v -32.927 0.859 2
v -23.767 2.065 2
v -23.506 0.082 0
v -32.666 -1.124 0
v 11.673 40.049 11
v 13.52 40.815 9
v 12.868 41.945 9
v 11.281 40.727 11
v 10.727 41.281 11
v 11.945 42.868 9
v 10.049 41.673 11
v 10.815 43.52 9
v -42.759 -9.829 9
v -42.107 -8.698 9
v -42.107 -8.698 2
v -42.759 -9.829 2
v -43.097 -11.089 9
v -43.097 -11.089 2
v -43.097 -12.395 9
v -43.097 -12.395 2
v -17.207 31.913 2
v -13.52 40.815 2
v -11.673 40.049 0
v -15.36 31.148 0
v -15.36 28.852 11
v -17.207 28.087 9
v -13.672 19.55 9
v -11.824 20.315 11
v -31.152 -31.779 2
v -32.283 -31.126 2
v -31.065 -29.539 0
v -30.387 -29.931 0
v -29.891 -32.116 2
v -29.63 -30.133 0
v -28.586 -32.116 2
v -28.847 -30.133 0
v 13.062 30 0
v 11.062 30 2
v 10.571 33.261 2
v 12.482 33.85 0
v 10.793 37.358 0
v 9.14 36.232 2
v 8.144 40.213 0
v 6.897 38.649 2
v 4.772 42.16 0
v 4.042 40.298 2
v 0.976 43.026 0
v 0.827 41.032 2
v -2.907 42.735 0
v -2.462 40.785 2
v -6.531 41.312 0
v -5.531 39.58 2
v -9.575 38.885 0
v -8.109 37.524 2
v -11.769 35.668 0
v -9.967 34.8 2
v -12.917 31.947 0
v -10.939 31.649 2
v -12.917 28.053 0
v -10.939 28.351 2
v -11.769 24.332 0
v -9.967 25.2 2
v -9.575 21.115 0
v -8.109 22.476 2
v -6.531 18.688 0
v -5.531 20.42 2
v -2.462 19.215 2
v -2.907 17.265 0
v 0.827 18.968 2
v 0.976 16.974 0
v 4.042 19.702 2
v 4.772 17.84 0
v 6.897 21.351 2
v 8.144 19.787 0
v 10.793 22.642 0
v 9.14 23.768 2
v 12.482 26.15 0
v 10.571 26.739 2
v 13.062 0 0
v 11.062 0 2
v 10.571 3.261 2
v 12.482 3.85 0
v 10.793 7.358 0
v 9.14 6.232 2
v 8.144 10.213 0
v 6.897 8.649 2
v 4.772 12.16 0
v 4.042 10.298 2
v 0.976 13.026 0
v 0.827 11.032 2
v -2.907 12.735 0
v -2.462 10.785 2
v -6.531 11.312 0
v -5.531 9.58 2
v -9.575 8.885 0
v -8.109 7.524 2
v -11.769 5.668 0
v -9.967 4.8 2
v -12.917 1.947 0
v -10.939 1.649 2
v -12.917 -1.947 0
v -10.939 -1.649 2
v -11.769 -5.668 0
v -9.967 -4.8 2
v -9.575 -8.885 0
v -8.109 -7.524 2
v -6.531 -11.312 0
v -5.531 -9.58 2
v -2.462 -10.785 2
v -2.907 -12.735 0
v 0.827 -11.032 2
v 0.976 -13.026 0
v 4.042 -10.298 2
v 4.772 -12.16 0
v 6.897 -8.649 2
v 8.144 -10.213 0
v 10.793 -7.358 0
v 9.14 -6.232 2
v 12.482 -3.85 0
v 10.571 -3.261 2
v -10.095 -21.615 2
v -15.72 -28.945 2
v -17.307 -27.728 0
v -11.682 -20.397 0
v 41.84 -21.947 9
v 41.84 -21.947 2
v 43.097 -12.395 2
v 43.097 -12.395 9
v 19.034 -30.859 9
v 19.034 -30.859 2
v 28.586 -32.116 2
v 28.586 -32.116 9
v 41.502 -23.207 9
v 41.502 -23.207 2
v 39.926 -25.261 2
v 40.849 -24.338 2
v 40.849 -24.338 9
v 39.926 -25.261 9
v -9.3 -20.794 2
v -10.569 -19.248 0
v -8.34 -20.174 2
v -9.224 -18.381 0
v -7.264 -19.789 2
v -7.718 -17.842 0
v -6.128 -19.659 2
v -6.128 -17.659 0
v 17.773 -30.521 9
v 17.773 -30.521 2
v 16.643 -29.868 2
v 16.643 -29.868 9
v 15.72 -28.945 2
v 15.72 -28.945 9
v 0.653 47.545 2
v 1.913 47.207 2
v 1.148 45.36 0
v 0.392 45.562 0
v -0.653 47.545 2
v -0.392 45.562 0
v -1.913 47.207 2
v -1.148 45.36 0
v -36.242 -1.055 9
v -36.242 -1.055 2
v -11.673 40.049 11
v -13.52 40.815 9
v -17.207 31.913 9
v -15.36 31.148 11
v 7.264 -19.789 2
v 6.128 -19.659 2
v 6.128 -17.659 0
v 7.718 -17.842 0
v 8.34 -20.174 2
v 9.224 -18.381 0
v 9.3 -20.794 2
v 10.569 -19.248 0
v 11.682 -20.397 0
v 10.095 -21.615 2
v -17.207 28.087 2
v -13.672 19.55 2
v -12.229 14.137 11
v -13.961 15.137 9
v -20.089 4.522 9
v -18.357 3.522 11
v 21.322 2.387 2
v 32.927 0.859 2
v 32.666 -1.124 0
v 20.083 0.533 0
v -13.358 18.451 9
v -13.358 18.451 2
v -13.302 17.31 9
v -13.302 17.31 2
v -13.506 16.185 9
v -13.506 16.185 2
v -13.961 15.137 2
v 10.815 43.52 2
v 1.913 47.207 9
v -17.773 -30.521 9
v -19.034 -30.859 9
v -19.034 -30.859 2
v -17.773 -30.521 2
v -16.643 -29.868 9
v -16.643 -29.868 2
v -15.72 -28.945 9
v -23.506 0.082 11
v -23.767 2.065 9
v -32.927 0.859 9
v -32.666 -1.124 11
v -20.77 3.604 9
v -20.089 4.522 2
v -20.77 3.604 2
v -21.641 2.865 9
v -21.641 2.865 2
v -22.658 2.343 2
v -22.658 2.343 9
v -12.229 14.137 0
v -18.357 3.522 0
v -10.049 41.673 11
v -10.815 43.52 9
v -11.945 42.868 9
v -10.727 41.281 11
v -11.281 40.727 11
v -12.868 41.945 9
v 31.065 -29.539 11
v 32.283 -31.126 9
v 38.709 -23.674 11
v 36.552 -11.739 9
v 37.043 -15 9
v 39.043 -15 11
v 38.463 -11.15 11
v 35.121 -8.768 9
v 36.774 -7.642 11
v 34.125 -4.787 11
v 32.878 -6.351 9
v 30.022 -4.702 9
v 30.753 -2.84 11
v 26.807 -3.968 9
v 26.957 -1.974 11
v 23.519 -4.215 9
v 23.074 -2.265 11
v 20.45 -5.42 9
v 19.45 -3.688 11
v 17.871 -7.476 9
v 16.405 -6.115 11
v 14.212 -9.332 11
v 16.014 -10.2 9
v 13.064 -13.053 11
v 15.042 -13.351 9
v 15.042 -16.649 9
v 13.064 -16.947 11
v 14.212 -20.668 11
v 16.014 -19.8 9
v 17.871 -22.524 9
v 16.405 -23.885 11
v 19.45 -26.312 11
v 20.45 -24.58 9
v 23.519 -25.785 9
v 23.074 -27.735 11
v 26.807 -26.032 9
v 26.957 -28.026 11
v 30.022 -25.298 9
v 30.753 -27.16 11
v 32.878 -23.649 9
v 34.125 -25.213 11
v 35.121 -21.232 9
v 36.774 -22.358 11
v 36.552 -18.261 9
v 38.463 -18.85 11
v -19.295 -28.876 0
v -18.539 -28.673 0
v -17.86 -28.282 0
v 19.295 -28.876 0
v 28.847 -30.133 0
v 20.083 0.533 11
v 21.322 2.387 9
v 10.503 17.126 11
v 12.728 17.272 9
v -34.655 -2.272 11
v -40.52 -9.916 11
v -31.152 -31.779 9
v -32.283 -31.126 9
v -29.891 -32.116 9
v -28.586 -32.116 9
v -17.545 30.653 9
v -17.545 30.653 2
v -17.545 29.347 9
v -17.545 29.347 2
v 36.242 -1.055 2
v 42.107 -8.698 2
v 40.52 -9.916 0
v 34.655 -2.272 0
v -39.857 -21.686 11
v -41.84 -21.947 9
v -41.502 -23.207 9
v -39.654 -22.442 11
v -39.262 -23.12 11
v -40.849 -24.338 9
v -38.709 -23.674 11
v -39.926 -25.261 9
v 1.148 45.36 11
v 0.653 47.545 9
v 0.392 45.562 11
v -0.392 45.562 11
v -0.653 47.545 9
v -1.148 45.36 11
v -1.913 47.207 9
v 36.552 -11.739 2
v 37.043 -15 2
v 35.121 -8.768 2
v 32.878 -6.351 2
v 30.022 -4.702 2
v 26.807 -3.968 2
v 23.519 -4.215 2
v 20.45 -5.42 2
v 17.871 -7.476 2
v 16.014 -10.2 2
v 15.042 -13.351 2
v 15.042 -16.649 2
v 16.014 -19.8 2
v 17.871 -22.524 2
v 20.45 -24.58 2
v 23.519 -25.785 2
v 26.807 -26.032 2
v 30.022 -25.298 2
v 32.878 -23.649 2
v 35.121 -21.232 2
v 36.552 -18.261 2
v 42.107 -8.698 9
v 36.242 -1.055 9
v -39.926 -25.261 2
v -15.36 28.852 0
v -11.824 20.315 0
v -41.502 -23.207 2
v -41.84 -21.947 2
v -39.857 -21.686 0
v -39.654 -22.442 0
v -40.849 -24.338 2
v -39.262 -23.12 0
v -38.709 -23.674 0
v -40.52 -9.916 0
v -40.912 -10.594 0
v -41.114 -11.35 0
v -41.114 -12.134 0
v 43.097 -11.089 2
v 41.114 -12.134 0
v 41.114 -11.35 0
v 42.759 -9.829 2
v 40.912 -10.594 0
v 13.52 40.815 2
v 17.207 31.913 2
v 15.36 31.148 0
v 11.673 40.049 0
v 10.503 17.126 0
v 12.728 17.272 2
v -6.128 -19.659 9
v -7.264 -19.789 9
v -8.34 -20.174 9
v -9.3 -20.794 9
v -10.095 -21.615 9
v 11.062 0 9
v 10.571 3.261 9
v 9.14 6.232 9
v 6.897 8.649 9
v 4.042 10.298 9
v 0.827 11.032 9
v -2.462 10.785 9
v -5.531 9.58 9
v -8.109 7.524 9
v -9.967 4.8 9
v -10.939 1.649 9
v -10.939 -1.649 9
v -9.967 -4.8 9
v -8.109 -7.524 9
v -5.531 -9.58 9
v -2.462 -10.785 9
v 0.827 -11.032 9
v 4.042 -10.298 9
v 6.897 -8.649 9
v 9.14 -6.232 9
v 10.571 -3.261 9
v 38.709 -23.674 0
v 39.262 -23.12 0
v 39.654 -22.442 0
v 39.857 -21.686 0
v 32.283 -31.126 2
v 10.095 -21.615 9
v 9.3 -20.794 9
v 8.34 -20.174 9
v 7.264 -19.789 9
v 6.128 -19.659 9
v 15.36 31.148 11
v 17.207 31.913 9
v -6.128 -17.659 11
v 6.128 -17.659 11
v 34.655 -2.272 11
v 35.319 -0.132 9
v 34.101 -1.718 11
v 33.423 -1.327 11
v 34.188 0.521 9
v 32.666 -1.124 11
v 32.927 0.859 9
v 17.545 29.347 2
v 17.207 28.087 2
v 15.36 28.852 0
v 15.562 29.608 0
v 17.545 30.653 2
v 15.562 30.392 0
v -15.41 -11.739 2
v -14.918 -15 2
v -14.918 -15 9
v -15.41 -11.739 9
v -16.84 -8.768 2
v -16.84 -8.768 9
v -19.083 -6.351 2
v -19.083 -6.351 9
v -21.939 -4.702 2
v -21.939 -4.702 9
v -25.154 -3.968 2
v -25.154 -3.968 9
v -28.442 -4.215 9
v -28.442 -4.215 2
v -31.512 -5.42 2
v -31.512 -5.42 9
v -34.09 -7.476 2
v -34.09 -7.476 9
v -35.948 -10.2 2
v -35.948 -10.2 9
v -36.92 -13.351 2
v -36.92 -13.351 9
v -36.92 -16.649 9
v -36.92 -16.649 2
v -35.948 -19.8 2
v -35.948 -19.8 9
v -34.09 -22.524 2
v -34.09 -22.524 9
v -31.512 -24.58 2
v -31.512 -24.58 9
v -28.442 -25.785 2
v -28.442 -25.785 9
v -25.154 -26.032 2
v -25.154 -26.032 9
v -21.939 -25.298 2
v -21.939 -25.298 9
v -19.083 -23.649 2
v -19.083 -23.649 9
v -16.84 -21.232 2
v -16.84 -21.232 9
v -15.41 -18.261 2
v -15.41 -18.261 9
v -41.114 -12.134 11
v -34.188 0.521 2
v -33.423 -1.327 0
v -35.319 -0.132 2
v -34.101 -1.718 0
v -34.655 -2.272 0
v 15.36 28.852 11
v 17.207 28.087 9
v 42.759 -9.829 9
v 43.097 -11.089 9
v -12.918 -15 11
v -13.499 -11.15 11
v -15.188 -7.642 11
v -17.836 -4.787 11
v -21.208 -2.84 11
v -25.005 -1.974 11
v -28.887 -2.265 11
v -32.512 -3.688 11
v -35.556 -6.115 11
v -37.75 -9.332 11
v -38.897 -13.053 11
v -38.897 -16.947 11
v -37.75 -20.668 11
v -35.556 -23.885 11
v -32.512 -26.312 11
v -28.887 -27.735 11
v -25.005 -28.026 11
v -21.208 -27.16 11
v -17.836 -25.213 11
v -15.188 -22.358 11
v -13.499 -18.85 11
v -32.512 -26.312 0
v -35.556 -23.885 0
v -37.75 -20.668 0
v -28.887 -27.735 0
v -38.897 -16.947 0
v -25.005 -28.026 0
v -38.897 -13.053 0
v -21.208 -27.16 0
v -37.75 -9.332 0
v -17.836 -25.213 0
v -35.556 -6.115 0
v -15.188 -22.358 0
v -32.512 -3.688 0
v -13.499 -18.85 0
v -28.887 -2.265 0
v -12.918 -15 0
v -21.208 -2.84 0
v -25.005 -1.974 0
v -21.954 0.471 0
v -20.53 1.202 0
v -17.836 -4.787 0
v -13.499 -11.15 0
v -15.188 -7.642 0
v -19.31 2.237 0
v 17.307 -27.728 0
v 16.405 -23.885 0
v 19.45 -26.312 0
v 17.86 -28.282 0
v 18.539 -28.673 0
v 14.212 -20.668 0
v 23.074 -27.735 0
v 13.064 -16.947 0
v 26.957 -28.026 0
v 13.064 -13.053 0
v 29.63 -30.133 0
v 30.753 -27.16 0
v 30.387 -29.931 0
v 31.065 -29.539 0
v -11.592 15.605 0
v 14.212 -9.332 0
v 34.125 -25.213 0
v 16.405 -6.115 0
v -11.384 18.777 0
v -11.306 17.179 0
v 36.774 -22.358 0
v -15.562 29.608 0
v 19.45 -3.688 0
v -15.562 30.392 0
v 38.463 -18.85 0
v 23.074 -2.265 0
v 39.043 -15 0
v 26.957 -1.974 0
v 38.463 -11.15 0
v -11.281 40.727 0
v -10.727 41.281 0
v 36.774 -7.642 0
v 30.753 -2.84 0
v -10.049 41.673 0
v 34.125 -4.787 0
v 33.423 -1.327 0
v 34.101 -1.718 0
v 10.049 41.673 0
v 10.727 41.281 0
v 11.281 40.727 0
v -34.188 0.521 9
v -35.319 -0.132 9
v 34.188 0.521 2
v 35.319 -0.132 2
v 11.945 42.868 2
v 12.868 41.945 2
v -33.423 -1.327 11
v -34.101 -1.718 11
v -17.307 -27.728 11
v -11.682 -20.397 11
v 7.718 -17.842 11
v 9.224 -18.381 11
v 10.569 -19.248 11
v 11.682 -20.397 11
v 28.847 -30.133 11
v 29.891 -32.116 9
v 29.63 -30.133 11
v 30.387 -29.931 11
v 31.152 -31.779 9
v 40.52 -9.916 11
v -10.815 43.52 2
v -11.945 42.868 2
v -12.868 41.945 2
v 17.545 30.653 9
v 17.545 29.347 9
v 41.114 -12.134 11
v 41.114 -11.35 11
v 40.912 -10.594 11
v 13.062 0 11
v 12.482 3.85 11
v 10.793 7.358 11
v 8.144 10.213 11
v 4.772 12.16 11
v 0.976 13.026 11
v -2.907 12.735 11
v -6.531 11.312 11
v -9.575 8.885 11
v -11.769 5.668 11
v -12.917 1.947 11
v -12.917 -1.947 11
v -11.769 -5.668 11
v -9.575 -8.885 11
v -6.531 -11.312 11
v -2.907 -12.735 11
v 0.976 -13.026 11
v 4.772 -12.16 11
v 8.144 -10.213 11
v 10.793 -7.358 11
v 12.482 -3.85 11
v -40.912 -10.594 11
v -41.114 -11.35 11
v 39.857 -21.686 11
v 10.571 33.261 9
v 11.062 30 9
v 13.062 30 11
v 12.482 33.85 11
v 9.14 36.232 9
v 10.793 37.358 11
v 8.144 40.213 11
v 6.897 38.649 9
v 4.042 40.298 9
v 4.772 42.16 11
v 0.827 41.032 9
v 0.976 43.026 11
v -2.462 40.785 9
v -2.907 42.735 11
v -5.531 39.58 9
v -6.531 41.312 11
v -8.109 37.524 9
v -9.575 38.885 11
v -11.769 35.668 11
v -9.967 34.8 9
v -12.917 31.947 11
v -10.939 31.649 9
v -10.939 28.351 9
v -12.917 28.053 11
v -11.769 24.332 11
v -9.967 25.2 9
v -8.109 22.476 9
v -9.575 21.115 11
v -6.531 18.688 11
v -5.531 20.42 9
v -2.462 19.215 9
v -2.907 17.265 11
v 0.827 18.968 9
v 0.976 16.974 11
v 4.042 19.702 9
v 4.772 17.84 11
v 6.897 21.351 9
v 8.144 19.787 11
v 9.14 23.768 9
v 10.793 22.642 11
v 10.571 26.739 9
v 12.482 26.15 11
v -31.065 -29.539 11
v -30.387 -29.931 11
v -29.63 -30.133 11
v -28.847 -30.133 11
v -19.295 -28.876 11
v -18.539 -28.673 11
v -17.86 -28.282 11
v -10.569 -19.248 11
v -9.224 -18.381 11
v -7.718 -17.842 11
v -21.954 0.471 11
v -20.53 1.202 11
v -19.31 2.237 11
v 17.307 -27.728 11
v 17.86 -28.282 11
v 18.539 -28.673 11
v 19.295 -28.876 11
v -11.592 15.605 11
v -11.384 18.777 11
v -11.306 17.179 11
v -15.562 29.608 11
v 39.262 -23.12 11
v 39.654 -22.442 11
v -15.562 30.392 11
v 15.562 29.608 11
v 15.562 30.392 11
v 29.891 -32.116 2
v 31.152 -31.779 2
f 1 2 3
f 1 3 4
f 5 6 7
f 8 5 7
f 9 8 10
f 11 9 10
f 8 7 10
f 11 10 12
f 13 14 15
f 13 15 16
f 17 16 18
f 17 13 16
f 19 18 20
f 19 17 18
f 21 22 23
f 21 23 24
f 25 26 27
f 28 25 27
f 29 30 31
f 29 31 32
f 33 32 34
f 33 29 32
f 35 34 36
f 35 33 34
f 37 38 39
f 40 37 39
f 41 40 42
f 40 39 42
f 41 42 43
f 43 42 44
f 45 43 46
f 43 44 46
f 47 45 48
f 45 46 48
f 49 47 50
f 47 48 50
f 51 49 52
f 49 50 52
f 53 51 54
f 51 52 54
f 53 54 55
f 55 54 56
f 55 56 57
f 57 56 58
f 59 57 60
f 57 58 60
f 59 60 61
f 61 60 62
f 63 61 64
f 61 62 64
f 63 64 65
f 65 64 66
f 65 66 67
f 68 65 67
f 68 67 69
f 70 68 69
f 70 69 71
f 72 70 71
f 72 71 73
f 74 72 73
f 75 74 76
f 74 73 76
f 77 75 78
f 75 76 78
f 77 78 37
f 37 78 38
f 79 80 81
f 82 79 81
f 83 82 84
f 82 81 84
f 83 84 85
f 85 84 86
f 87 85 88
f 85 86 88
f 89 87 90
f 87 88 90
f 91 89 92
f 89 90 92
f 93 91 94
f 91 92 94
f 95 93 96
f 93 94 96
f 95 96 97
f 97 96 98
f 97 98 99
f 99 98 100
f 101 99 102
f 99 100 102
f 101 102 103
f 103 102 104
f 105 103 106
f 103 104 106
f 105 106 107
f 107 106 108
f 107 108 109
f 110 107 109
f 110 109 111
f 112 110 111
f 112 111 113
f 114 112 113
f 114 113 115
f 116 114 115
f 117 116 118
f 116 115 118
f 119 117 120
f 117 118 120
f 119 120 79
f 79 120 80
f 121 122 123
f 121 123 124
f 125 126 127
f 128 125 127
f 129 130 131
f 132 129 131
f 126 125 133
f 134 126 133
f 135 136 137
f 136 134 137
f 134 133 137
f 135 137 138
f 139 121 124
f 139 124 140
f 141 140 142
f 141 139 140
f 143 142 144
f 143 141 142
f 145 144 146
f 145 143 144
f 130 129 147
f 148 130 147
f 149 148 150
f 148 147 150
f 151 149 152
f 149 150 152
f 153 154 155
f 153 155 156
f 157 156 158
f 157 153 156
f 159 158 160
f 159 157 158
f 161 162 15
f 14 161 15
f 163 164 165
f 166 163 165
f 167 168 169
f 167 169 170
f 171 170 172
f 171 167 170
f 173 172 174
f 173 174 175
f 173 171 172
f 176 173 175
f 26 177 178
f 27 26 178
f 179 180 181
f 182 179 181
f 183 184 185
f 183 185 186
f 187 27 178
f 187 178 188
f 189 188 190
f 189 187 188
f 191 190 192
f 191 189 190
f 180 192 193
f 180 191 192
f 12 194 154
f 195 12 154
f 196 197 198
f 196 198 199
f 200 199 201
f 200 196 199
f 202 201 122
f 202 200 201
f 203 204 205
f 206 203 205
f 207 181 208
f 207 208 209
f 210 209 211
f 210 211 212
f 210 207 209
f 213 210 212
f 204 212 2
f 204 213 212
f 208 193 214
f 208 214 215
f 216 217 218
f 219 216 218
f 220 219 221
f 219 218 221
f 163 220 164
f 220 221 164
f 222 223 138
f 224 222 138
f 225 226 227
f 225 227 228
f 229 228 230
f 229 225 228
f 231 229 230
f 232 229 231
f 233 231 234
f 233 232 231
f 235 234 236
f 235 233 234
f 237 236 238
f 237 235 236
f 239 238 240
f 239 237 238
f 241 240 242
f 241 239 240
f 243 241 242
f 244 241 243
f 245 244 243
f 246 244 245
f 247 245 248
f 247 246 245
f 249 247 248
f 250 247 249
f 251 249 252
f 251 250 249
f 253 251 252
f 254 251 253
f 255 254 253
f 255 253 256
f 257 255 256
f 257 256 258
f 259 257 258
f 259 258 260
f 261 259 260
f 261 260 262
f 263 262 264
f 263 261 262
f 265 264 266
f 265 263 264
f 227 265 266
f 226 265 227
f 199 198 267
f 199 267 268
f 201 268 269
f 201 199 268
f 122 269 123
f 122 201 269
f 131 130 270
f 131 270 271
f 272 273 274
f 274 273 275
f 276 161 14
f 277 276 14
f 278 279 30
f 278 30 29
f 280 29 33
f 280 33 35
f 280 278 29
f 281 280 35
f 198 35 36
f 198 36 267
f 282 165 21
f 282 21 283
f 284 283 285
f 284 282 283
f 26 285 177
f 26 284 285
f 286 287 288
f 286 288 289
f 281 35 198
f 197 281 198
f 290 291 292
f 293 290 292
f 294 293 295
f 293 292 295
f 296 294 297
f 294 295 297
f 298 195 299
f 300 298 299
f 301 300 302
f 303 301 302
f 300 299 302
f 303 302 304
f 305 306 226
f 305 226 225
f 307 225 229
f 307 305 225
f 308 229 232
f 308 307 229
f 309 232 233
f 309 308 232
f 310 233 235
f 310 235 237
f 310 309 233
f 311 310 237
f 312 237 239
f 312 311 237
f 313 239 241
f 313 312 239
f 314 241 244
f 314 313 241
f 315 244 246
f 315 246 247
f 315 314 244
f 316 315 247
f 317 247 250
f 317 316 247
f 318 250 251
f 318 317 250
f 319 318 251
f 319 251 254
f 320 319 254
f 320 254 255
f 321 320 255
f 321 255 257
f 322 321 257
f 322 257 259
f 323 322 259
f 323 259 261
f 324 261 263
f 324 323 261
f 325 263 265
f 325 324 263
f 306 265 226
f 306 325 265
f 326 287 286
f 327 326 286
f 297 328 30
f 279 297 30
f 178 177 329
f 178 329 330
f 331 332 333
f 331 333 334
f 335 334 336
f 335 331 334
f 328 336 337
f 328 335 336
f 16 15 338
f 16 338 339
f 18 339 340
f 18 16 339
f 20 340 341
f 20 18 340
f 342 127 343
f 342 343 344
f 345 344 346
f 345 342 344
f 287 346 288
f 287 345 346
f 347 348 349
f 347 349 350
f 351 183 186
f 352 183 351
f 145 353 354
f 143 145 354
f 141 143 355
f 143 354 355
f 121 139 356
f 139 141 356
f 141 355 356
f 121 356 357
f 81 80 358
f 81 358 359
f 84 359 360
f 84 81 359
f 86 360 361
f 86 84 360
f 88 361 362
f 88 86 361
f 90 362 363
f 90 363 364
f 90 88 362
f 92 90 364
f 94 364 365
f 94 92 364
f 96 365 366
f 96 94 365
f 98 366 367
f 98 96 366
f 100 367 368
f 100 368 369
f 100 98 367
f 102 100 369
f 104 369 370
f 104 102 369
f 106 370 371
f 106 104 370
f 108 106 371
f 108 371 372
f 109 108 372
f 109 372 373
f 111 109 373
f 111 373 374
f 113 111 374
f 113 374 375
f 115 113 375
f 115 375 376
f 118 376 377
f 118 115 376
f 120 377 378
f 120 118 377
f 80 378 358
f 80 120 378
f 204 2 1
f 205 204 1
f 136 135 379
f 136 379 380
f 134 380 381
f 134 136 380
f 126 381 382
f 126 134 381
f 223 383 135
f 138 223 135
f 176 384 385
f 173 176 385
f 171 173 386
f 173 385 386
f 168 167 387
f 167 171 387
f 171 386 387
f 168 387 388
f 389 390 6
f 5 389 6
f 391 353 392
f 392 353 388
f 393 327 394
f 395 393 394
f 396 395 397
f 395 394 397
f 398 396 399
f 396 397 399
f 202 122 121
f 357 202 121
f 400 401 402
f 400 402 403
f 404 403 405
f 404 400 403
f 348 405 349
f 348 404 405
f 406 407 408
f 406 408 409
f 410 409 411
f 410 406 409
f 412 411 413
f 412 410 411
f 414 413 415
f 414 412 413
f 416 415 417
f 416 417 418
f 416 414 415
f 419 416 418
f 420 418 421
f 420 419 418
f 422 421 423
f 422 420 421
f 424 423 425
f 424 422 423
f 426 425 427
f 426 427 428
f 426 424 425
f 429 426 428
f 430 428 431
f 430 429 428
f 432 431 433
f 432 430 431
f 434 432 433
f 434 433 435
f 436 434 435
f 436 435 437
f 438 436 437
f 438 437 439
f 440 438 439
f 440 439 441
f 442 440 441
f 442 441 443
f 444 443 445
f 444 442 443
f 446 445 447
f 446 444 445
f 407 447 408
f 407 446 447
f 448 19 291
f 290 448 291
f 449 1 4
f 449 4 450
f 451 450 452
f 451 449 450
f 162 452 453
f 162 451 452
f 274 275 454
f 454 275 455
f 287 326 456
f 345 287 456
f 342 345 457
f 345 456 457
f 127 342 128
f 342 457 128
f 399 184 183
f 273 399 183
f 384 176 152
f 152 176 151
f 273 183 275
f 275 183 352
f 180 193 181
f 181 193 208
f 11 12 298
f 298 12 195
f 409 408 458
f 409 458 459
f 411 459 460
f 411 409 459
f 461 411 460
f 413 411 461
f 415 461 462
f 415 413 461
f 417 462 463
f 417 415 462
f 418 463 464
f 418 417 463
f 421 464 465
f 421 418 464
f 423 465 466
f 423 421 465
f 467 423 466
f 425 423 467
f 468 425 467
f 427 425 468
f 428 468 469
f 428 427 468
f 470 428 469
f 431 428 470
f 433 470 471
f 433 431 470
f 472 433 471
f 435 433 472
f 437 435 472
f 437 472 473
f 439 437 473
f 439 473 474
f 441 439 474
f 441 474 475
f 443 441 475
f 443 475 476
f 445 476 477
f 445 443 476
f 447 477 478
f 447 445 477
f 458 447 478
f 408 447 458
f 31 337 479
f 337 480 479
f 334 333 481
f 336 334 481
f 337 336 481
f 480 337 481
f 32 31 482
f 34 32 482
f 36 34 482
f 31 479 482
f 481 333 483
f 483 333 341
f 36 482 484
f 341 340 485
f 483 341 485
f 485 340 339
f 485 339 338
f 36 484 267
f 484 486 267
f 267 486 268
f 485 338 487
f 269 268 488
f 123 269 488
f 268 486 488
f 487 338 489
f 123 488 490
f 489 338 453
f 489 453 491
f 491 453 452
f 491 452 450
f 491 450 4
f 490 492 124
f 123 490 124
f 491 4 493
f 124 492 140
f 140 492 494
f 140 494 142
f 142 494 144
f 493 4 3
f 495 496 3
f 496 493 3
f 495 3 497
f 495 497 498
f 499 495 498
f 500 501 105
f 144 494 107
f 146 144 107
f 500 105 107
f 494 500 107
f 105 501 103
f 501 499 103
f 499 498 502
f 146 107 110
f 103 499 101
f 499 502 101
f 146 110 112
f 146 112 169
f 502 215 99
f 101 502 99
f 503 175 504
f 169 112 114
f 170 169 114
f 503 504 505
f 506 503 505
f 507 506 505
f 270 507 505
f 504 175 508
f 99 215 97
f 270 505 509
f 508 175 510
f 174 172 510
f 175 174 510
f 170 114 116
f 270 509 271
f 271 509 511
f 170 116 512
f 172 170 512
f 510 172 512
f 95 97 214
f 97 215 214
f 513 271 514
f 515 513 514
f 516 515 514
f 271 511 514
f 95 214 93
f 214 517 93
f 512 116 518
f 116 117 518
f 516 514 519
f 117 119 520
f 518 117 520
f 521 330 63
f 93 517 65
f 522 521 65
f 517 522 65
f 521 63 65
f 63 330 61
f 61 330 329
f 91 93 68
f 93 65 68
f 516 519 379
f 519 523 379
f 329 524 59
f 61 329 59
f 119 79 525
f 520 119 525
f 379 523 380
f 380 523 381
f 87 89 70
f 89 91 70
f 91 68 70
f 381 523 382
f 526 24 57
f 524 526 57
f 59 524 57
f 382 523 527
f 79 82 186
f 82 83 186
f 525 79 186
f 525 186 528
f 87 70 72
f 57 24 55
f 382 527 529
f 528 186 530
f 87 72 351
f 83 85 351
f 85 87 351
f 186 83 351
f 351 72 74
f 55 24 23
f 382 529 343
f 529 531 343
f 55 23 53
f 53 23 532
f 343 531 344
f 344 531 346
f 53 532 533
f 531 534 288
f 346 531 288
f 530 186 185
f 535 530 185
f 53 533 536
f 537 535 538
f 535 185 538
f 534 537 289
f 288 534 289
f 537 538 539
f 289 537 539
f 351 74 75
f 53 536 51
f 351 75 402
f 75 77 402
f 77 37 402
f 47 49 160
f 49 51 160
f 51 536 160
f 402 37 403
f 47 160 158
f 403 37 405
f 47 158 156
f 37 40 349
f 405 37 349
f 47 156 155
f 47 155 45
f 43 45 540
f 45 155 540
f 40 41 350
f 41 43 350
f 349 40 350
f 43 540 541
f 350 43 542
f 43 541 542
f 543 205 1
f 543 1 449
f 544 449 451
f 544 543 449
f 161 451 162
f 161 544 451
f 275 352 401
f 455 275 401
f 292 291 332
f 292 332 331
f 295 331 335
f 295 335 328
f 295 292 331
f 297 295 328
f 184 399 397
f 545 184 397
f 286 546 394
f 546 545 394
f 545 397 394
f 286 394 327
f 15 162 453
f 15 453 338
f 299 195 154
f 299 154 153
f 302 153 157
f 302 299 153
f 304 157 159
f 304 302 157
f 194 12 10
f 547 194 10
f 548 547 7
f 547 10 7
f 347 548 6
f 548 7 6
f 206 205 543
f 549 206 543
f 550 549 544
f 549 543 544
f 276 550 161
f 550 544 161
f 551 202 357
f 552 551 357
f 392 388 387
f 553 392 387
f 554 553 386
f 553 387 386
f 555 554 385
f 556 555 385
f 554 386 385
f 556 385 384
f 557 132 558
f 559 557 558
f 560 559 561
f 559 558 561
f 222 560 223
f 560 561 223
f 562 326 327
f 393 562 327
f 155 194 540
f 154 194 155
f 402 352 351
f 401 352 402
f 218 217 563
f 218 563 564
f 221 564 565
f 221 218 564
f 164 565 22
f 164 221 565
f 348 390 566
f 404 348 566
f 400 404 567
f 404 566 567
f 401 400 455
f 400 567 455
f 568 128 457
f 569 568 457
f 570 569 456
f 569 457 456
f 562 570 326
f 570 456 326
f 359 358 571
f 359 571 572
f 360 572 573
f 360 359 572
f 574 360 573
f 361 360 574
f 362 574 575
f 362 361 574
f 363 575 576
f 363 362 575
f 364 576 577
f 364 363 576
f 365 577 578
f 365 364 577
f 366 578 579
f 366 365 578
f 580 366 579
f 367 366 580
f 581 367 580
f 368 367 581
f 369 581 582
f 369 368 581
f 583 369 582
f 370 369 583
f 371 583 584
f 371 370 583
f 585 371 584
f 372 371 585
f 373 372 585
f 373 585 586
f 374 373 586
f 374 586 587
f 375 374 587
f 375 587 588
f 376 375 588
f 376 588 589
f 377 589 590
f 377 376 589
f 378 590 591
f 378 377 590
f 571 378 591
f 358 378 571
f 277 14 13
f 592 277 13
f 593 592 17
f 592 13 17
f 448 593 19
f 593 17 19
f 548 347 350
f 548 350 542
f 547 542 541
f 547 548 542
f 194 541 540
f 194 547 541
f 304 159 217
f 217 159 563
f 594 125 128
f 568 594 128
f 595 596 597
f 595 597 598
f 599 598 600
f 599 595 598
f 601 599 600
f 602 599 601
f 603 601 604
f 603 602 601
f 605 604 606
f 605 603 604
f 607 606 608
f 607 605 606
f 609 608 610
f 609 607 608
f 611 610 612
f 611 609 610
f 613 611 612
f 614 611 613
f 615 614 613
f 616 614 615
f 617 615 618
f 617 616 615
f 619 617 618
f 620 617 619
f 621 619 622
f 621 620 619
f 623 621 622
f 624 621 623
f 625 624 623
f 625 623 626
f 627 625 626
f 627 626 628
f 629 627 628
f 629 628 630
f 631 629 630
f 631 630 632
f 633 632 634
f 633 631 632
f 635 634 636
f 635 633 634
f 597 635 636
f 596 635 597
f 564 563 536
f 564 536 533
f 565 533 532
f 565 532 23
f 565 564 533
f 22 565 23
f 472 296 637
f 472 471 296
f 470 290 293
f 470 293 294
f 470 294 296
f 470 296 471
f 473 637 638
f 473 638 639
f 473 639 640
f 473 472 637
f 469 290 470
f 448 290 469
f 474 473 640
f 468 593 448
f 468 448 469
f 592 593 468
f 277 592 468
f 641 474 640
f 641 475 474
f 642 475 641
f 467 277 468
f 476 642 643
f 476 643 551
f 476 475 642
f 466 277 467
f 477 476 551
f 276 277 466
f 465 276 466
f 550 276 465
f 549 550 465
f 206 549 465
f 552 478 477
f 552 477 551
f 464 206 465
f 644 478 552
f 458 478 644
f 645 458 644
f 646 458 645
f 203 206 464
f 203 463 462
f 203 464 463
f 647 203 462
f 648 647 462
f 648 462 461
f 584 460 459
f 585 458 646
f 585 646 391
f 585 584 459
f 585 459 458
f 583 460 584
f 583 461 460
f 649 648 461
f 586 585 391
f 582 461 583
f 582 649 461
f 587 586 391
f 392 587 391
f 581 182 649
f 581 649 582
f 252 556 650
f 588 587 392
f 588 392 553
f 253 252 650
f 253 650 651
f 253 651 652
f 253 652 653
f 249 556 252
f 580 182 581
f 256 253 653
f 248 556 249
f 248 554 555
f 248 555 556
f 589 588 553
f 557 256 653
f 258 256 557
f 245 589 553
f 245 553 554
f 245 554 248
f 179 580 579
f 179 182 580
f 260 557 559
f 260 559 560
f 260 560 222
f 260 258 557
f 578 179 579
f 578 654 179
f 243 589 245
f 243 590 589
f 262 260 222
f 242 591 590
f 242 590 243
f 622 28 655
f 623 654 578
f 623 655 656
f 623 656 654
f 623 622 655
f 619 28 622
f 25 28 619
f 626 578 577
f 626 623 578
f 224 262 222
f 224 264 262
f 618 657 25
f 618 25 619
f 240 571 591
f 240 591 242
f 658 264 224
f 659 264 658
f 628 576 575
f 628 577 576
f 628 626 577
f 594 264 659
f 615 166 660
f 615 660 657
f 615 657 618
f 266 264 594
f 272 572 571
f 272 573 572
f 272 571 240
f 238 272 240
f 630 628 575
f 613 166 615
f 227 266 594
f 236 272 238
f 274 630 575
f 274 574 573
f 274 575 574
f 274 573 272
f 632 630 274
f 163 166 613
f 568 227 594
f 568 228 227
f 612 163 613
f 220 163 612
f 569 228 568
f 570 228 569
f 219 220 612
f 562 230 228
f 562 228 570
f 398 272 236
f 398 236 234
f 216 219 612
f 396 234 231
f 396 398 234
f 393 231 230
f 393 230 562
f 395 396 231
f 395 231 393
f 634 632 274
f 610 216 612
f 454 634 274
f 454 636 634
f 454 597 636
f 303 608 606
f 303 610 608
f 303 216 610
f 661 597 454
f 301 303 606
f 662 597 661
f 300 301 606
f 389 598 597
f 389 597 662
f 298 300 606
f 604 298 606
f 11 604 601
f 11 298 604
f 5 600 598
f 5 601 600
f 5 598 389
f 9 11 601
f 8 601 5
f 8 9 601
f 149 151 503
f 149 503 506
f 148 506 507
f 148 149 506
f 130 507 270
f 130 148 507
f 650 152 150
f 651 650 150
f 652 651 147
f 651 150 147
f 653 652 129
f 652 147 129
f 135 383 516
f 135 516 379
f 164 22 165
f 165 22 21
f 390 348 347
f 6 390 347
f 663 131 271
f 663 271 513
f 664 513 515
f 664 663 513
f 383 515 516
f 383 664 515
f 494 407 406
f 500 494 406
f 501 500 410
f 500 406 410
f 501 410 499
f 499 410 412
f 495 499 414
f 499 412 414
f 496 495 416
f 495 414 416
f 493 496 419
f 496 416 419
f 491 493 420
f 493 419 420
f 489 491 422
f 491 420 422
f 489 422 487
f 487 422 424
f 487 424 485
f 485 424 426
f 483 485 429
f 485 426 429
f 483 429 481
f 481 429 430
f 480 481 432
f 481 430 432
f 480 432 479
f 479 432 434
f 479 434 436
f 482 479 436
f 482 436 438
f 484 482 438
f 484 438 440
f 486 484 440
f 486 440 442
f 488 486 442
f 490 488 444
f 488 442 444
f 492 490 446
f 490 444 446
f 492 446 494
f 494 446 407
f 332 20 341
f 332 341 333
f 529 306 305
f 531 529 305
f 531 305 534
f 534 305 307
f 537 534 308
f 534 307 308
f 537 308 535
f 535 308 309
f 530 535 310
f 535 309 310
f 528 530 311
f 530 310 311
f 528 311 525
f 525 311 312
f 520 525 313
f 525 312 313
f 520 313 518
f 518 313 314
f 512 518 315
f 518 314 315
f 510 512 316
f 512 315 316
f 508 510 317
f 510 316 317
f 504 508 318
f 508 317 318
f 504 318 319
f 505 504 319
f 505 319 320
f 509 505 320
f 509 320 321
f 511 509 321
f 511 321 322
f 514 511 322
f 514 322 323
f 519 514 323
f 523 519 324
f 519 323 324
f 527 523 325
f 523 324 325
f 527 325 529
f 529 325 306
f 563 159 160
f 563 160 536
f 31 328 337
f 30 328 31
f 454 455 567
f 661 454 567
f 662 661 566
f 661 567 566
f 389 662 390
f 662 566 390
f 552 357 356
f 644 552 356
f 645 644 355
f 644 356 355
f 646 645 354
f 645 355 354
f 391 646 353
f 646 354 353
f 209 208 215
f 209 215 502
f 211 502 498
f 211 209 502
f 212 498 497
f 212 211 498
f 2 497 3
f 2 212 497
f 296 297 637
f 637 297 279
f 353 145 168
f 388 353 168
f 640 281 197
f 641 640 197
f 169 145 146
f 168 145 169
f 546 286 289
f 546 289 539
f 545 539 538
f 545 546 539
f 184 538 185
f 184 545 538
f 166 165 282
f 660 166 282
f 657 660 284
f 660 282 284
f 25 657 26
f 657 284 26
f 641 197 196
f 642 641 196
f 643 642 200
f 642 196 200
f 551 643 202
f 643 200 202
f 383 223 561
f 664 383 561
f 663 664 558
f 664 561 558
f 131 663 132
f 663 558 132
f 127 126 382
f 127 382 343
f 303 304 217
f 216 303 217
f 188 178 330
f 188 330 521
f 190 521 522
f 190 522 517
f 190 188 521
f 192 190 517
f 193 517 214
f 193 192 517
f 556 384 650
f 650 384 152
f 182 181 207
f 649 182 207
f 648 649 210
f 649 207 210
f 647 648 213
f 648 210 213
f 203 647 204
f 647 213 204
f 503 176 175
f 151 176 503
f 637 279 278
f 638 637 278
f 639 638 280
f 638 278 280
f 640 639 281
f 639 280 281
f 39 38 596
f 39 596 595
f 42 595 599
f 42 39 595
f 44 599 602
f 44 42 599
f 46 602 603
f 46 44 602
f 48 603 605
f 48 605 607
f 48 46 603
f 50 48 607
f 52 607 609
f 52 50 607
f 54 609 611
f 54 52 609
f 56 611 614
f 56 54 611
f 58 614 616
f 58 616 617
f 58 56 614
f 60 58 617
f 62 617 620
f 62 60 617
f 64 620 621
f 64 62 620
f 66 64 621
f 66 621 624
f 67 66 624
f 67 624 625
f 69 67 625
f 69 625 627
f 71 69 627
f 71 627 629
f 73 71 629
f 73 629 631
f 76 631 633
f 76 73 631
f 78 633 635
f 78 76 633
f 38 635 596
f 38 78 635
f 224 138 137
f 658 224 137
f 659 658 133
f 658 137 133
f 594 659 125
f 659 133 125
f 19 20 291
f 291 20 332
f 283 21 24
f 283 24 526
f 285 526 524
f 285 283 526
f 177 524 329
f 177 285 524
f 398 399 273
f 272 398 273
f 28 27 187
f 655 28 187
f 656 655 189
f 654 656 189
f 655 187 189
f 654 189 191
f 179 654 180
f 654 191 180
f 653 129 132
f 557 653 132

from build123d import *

# Parameters (mm, degrees)
F0_R     = 11.0625
F1_DEPTH = 11
F2_R     = 5
F3_SIZE  = 2
F4_SIZE  = 2


# Not quite as in the source:
# - a feature names something its author has since deleted; it is built from what else it names


with BuildPart() as f1:
    # F0 (on Top) → F1 (new body)
    with BuildSketch(Plane.XY):
        Polygon((12.7279220614, 42.7279220614), (0, 48), (-12.7279220614, 42.7279220614), (-18, 30), (-12.7279220614, 17.2720779386), (-21.3220193017, 2.3866648732), (-34.9807621135, 0.5884572681), (-43.3674269867, -10.3412571882), (-41.5692193817, -24), (-30.6395049254, -32.3866648732), (-16.9807621135, -30.5884572681), (-8.5940972403, -19.6587428118), (8.5940972403, -19.6587428118), (16.9807621135, -30.5884572681), (30.6395049254, -32.3866648732), (41.5692193817, -24), (43.3674269867, -10.3412571882), (34.9807621135, 0.5884572681), (21.3220193017, 2.3866648732), (12.7279220614, 17.2720779386), (18, 30), align=None)
        with Locations((-25.9807621135, -15)):
            Circle(F0_R, mode=Mode.SUBTRACT)
        Circle(F0_R, mode=Mode.SUBTRACT)
        with Locations((25.9807621135, -15)):
            Circle(F0_R, mode=Mode.SUBTRACT)
        with Locations((0, 30)):
            Circle(F0_R, mode=Mode.SUBTRACT)
    extrude(amount=F1_DEPTH)

    # F2
    f2_edges = [f1.edges().sort_by_distance(p)[0] for p in [
        (-16.980762, -30.588457, 5.5),
        (-30.639505, -32.386665, 5.5),
        (-41.569219, -24, 5.5),
        (-43.367427, -10.341257, 5.5),
        (-34.980762, 0.588457, 5.5),
        (-18, 30, 5.5),
        (-12.727922, 42.727922, 5.5),
        (0, 48, 5.5),
        (12.727922, 42.727922, 5.5),
        (34.980762, 0.588457, 5.5),
        (43.367427, -10.341257, 5.5),
        (41.569219, -24, 5.5),
        (30.639505, -32.386665, 5.5),
        (16.980762, -30.588457, 5.5),
        (8.594097, -19.658743, 5.5),
        (-8.594097, -19.658743, 5.5),
        (18, 30, 5.5),
        (-12.727922, 17.272078, 5.5),
        (-21.322019, 2.386665, 5.5),
    ]]
    fillet(f2_edges, radius=F2_R)

    # F3
    f3_edges = [f1.edges().sort_by_distance(p)[0] for p in [
        (27.124716, 1.622725, 11),
        (34.774782, 0.231689, 11),
        (17.024971, 9.829371, 11),
        (39.174095, -4.8764, 11),
        (14.967679, 22.67933, 11),
        (42.969503, -10.447881, 11),
        (17.588039, 30, 11),
        (42.468323, -17.170629, 11),
        (15.363961, 36.363961, 11),
        (41.212451, -23.794019, 11),
        (12.436622, 42.436622, 11),
        (36.104362, -28.193332, 11),
        (6.363961, 45.363961, 11),
        (30.532882, -31.988741, 11),
        (0, 47.588039, 11),
        (23.810134, -31.487561, 11),
        (-6.363961, 45.363961, 11),
        (17.186743, -30.231689, 11),
        (-12.436622, 42.436622, 11),
        (12.907556, -25.280152, 11),
        (-15.363961, 36.363961, 11),
        (8.339814, -20.174379, 11),
        (-17.588039, 30, 11),
        (0, -19.658743, 11),
        (-15.439476, 23.818348, 11),
        (-8.339814, -20.174379, 11),
        (-13.301618, 17.30968, 11),
        (-12.907556, -25.280152, 11),
        (-17.024971, 9.829371, 11),
        (-17.186743, -30.231689, 11),
        (-21.641432, 2.864699, 11),
        (-23.810134, -31.487561, 11),
        (-28.347032, 1.461804, 11),
        (-30.532882, -31.988741, 11),
        (-34.774782, 0.231689, 11),
        (-36.104362, -28.193332, 11),
        (-39.174095, -4.8764, 11),
        (-41.212451, -23.794019, 11),
        (-42.969503, -10.447881, 11),
        (-42.468323, -17.170629, 11),
        (-37.043262, -15, 11),
        (-11.0625, 0, 11),
        (14.918262, -15, 11),
        (-11.0625, 30, 11),
    ]]
    chamfer(f3_edges, length=F3_SIZE)

    # F4
    f4_edges = [f1.edges().sort_by_distance(p)[0] for p in [
        (27.124716, 1.622725, 0),
        (34.774782, 0.231689, 0),
        (17.024971, 9.829371, 0),
        (39.174095, -4.8764, 0),
        (14.967679, 22.67933, 0),
        (42.969503, -10.447881, 0),
        (17.588039, 30, 0),
        (42.468323, -17.170629, 0),
        (15.363961, 36.363961, 0),
        (41.212451, -23.794019, 0),
        (12.436622, 42.436622, 0),
        (36.104362, -28.193332, 0),
        (6.363961, 45.363961, 0),
        (30.532882, -31.988741, 0),
        (0, 47.588039, 0),
        (23.810134, -31.487561, 0),
        (-6.363961, 45.363961, 0),
        (17.186743, -30.231689, 0),
        (-12.436622, 42.436622, 0),
        (12.907556, -25.280152, 0),
        (-15.363961, 36.363961, 0),
        (8.339814, -20.174379, 0),
        (-17.588039, 30, 0),
        (0, -19.658743, 0),
        (-15.439476, 23.818348, 0),
        (-8.339814, -20.174379, 0),
        (-13.301618, 17.30968, 0),
        (-12.907556, -25.280152, 0),
        (-17.024971, 9.829371, 0),
        (-17.186743, -30.231689, 0),
        (-21.641432, 2.864699, 0),
        (-23.810134, -31.487561, 0),
        (-28.347032, 1.461804, 0),
        (-30.532882, -31.988741, 0),
        (-34.774782, 0.231689, 0),
        (-36.104362, -28.193332, 0),
        (-39.174095, -4.8764, 0),
        (-41.212451, -23.794019, 0),
        (-42.969503, -10.447881, 0),
        (-42.468323, -17.170629, 0),
        (-37.043262, -15, 0),
        (-11.0625, 0, 0),
        (14.918262, -15, 0),
        (-11.0625, 30, 0),
    ]]
    chamfer(f4_edges, length=F4_SIZE)


solid = f1.part
